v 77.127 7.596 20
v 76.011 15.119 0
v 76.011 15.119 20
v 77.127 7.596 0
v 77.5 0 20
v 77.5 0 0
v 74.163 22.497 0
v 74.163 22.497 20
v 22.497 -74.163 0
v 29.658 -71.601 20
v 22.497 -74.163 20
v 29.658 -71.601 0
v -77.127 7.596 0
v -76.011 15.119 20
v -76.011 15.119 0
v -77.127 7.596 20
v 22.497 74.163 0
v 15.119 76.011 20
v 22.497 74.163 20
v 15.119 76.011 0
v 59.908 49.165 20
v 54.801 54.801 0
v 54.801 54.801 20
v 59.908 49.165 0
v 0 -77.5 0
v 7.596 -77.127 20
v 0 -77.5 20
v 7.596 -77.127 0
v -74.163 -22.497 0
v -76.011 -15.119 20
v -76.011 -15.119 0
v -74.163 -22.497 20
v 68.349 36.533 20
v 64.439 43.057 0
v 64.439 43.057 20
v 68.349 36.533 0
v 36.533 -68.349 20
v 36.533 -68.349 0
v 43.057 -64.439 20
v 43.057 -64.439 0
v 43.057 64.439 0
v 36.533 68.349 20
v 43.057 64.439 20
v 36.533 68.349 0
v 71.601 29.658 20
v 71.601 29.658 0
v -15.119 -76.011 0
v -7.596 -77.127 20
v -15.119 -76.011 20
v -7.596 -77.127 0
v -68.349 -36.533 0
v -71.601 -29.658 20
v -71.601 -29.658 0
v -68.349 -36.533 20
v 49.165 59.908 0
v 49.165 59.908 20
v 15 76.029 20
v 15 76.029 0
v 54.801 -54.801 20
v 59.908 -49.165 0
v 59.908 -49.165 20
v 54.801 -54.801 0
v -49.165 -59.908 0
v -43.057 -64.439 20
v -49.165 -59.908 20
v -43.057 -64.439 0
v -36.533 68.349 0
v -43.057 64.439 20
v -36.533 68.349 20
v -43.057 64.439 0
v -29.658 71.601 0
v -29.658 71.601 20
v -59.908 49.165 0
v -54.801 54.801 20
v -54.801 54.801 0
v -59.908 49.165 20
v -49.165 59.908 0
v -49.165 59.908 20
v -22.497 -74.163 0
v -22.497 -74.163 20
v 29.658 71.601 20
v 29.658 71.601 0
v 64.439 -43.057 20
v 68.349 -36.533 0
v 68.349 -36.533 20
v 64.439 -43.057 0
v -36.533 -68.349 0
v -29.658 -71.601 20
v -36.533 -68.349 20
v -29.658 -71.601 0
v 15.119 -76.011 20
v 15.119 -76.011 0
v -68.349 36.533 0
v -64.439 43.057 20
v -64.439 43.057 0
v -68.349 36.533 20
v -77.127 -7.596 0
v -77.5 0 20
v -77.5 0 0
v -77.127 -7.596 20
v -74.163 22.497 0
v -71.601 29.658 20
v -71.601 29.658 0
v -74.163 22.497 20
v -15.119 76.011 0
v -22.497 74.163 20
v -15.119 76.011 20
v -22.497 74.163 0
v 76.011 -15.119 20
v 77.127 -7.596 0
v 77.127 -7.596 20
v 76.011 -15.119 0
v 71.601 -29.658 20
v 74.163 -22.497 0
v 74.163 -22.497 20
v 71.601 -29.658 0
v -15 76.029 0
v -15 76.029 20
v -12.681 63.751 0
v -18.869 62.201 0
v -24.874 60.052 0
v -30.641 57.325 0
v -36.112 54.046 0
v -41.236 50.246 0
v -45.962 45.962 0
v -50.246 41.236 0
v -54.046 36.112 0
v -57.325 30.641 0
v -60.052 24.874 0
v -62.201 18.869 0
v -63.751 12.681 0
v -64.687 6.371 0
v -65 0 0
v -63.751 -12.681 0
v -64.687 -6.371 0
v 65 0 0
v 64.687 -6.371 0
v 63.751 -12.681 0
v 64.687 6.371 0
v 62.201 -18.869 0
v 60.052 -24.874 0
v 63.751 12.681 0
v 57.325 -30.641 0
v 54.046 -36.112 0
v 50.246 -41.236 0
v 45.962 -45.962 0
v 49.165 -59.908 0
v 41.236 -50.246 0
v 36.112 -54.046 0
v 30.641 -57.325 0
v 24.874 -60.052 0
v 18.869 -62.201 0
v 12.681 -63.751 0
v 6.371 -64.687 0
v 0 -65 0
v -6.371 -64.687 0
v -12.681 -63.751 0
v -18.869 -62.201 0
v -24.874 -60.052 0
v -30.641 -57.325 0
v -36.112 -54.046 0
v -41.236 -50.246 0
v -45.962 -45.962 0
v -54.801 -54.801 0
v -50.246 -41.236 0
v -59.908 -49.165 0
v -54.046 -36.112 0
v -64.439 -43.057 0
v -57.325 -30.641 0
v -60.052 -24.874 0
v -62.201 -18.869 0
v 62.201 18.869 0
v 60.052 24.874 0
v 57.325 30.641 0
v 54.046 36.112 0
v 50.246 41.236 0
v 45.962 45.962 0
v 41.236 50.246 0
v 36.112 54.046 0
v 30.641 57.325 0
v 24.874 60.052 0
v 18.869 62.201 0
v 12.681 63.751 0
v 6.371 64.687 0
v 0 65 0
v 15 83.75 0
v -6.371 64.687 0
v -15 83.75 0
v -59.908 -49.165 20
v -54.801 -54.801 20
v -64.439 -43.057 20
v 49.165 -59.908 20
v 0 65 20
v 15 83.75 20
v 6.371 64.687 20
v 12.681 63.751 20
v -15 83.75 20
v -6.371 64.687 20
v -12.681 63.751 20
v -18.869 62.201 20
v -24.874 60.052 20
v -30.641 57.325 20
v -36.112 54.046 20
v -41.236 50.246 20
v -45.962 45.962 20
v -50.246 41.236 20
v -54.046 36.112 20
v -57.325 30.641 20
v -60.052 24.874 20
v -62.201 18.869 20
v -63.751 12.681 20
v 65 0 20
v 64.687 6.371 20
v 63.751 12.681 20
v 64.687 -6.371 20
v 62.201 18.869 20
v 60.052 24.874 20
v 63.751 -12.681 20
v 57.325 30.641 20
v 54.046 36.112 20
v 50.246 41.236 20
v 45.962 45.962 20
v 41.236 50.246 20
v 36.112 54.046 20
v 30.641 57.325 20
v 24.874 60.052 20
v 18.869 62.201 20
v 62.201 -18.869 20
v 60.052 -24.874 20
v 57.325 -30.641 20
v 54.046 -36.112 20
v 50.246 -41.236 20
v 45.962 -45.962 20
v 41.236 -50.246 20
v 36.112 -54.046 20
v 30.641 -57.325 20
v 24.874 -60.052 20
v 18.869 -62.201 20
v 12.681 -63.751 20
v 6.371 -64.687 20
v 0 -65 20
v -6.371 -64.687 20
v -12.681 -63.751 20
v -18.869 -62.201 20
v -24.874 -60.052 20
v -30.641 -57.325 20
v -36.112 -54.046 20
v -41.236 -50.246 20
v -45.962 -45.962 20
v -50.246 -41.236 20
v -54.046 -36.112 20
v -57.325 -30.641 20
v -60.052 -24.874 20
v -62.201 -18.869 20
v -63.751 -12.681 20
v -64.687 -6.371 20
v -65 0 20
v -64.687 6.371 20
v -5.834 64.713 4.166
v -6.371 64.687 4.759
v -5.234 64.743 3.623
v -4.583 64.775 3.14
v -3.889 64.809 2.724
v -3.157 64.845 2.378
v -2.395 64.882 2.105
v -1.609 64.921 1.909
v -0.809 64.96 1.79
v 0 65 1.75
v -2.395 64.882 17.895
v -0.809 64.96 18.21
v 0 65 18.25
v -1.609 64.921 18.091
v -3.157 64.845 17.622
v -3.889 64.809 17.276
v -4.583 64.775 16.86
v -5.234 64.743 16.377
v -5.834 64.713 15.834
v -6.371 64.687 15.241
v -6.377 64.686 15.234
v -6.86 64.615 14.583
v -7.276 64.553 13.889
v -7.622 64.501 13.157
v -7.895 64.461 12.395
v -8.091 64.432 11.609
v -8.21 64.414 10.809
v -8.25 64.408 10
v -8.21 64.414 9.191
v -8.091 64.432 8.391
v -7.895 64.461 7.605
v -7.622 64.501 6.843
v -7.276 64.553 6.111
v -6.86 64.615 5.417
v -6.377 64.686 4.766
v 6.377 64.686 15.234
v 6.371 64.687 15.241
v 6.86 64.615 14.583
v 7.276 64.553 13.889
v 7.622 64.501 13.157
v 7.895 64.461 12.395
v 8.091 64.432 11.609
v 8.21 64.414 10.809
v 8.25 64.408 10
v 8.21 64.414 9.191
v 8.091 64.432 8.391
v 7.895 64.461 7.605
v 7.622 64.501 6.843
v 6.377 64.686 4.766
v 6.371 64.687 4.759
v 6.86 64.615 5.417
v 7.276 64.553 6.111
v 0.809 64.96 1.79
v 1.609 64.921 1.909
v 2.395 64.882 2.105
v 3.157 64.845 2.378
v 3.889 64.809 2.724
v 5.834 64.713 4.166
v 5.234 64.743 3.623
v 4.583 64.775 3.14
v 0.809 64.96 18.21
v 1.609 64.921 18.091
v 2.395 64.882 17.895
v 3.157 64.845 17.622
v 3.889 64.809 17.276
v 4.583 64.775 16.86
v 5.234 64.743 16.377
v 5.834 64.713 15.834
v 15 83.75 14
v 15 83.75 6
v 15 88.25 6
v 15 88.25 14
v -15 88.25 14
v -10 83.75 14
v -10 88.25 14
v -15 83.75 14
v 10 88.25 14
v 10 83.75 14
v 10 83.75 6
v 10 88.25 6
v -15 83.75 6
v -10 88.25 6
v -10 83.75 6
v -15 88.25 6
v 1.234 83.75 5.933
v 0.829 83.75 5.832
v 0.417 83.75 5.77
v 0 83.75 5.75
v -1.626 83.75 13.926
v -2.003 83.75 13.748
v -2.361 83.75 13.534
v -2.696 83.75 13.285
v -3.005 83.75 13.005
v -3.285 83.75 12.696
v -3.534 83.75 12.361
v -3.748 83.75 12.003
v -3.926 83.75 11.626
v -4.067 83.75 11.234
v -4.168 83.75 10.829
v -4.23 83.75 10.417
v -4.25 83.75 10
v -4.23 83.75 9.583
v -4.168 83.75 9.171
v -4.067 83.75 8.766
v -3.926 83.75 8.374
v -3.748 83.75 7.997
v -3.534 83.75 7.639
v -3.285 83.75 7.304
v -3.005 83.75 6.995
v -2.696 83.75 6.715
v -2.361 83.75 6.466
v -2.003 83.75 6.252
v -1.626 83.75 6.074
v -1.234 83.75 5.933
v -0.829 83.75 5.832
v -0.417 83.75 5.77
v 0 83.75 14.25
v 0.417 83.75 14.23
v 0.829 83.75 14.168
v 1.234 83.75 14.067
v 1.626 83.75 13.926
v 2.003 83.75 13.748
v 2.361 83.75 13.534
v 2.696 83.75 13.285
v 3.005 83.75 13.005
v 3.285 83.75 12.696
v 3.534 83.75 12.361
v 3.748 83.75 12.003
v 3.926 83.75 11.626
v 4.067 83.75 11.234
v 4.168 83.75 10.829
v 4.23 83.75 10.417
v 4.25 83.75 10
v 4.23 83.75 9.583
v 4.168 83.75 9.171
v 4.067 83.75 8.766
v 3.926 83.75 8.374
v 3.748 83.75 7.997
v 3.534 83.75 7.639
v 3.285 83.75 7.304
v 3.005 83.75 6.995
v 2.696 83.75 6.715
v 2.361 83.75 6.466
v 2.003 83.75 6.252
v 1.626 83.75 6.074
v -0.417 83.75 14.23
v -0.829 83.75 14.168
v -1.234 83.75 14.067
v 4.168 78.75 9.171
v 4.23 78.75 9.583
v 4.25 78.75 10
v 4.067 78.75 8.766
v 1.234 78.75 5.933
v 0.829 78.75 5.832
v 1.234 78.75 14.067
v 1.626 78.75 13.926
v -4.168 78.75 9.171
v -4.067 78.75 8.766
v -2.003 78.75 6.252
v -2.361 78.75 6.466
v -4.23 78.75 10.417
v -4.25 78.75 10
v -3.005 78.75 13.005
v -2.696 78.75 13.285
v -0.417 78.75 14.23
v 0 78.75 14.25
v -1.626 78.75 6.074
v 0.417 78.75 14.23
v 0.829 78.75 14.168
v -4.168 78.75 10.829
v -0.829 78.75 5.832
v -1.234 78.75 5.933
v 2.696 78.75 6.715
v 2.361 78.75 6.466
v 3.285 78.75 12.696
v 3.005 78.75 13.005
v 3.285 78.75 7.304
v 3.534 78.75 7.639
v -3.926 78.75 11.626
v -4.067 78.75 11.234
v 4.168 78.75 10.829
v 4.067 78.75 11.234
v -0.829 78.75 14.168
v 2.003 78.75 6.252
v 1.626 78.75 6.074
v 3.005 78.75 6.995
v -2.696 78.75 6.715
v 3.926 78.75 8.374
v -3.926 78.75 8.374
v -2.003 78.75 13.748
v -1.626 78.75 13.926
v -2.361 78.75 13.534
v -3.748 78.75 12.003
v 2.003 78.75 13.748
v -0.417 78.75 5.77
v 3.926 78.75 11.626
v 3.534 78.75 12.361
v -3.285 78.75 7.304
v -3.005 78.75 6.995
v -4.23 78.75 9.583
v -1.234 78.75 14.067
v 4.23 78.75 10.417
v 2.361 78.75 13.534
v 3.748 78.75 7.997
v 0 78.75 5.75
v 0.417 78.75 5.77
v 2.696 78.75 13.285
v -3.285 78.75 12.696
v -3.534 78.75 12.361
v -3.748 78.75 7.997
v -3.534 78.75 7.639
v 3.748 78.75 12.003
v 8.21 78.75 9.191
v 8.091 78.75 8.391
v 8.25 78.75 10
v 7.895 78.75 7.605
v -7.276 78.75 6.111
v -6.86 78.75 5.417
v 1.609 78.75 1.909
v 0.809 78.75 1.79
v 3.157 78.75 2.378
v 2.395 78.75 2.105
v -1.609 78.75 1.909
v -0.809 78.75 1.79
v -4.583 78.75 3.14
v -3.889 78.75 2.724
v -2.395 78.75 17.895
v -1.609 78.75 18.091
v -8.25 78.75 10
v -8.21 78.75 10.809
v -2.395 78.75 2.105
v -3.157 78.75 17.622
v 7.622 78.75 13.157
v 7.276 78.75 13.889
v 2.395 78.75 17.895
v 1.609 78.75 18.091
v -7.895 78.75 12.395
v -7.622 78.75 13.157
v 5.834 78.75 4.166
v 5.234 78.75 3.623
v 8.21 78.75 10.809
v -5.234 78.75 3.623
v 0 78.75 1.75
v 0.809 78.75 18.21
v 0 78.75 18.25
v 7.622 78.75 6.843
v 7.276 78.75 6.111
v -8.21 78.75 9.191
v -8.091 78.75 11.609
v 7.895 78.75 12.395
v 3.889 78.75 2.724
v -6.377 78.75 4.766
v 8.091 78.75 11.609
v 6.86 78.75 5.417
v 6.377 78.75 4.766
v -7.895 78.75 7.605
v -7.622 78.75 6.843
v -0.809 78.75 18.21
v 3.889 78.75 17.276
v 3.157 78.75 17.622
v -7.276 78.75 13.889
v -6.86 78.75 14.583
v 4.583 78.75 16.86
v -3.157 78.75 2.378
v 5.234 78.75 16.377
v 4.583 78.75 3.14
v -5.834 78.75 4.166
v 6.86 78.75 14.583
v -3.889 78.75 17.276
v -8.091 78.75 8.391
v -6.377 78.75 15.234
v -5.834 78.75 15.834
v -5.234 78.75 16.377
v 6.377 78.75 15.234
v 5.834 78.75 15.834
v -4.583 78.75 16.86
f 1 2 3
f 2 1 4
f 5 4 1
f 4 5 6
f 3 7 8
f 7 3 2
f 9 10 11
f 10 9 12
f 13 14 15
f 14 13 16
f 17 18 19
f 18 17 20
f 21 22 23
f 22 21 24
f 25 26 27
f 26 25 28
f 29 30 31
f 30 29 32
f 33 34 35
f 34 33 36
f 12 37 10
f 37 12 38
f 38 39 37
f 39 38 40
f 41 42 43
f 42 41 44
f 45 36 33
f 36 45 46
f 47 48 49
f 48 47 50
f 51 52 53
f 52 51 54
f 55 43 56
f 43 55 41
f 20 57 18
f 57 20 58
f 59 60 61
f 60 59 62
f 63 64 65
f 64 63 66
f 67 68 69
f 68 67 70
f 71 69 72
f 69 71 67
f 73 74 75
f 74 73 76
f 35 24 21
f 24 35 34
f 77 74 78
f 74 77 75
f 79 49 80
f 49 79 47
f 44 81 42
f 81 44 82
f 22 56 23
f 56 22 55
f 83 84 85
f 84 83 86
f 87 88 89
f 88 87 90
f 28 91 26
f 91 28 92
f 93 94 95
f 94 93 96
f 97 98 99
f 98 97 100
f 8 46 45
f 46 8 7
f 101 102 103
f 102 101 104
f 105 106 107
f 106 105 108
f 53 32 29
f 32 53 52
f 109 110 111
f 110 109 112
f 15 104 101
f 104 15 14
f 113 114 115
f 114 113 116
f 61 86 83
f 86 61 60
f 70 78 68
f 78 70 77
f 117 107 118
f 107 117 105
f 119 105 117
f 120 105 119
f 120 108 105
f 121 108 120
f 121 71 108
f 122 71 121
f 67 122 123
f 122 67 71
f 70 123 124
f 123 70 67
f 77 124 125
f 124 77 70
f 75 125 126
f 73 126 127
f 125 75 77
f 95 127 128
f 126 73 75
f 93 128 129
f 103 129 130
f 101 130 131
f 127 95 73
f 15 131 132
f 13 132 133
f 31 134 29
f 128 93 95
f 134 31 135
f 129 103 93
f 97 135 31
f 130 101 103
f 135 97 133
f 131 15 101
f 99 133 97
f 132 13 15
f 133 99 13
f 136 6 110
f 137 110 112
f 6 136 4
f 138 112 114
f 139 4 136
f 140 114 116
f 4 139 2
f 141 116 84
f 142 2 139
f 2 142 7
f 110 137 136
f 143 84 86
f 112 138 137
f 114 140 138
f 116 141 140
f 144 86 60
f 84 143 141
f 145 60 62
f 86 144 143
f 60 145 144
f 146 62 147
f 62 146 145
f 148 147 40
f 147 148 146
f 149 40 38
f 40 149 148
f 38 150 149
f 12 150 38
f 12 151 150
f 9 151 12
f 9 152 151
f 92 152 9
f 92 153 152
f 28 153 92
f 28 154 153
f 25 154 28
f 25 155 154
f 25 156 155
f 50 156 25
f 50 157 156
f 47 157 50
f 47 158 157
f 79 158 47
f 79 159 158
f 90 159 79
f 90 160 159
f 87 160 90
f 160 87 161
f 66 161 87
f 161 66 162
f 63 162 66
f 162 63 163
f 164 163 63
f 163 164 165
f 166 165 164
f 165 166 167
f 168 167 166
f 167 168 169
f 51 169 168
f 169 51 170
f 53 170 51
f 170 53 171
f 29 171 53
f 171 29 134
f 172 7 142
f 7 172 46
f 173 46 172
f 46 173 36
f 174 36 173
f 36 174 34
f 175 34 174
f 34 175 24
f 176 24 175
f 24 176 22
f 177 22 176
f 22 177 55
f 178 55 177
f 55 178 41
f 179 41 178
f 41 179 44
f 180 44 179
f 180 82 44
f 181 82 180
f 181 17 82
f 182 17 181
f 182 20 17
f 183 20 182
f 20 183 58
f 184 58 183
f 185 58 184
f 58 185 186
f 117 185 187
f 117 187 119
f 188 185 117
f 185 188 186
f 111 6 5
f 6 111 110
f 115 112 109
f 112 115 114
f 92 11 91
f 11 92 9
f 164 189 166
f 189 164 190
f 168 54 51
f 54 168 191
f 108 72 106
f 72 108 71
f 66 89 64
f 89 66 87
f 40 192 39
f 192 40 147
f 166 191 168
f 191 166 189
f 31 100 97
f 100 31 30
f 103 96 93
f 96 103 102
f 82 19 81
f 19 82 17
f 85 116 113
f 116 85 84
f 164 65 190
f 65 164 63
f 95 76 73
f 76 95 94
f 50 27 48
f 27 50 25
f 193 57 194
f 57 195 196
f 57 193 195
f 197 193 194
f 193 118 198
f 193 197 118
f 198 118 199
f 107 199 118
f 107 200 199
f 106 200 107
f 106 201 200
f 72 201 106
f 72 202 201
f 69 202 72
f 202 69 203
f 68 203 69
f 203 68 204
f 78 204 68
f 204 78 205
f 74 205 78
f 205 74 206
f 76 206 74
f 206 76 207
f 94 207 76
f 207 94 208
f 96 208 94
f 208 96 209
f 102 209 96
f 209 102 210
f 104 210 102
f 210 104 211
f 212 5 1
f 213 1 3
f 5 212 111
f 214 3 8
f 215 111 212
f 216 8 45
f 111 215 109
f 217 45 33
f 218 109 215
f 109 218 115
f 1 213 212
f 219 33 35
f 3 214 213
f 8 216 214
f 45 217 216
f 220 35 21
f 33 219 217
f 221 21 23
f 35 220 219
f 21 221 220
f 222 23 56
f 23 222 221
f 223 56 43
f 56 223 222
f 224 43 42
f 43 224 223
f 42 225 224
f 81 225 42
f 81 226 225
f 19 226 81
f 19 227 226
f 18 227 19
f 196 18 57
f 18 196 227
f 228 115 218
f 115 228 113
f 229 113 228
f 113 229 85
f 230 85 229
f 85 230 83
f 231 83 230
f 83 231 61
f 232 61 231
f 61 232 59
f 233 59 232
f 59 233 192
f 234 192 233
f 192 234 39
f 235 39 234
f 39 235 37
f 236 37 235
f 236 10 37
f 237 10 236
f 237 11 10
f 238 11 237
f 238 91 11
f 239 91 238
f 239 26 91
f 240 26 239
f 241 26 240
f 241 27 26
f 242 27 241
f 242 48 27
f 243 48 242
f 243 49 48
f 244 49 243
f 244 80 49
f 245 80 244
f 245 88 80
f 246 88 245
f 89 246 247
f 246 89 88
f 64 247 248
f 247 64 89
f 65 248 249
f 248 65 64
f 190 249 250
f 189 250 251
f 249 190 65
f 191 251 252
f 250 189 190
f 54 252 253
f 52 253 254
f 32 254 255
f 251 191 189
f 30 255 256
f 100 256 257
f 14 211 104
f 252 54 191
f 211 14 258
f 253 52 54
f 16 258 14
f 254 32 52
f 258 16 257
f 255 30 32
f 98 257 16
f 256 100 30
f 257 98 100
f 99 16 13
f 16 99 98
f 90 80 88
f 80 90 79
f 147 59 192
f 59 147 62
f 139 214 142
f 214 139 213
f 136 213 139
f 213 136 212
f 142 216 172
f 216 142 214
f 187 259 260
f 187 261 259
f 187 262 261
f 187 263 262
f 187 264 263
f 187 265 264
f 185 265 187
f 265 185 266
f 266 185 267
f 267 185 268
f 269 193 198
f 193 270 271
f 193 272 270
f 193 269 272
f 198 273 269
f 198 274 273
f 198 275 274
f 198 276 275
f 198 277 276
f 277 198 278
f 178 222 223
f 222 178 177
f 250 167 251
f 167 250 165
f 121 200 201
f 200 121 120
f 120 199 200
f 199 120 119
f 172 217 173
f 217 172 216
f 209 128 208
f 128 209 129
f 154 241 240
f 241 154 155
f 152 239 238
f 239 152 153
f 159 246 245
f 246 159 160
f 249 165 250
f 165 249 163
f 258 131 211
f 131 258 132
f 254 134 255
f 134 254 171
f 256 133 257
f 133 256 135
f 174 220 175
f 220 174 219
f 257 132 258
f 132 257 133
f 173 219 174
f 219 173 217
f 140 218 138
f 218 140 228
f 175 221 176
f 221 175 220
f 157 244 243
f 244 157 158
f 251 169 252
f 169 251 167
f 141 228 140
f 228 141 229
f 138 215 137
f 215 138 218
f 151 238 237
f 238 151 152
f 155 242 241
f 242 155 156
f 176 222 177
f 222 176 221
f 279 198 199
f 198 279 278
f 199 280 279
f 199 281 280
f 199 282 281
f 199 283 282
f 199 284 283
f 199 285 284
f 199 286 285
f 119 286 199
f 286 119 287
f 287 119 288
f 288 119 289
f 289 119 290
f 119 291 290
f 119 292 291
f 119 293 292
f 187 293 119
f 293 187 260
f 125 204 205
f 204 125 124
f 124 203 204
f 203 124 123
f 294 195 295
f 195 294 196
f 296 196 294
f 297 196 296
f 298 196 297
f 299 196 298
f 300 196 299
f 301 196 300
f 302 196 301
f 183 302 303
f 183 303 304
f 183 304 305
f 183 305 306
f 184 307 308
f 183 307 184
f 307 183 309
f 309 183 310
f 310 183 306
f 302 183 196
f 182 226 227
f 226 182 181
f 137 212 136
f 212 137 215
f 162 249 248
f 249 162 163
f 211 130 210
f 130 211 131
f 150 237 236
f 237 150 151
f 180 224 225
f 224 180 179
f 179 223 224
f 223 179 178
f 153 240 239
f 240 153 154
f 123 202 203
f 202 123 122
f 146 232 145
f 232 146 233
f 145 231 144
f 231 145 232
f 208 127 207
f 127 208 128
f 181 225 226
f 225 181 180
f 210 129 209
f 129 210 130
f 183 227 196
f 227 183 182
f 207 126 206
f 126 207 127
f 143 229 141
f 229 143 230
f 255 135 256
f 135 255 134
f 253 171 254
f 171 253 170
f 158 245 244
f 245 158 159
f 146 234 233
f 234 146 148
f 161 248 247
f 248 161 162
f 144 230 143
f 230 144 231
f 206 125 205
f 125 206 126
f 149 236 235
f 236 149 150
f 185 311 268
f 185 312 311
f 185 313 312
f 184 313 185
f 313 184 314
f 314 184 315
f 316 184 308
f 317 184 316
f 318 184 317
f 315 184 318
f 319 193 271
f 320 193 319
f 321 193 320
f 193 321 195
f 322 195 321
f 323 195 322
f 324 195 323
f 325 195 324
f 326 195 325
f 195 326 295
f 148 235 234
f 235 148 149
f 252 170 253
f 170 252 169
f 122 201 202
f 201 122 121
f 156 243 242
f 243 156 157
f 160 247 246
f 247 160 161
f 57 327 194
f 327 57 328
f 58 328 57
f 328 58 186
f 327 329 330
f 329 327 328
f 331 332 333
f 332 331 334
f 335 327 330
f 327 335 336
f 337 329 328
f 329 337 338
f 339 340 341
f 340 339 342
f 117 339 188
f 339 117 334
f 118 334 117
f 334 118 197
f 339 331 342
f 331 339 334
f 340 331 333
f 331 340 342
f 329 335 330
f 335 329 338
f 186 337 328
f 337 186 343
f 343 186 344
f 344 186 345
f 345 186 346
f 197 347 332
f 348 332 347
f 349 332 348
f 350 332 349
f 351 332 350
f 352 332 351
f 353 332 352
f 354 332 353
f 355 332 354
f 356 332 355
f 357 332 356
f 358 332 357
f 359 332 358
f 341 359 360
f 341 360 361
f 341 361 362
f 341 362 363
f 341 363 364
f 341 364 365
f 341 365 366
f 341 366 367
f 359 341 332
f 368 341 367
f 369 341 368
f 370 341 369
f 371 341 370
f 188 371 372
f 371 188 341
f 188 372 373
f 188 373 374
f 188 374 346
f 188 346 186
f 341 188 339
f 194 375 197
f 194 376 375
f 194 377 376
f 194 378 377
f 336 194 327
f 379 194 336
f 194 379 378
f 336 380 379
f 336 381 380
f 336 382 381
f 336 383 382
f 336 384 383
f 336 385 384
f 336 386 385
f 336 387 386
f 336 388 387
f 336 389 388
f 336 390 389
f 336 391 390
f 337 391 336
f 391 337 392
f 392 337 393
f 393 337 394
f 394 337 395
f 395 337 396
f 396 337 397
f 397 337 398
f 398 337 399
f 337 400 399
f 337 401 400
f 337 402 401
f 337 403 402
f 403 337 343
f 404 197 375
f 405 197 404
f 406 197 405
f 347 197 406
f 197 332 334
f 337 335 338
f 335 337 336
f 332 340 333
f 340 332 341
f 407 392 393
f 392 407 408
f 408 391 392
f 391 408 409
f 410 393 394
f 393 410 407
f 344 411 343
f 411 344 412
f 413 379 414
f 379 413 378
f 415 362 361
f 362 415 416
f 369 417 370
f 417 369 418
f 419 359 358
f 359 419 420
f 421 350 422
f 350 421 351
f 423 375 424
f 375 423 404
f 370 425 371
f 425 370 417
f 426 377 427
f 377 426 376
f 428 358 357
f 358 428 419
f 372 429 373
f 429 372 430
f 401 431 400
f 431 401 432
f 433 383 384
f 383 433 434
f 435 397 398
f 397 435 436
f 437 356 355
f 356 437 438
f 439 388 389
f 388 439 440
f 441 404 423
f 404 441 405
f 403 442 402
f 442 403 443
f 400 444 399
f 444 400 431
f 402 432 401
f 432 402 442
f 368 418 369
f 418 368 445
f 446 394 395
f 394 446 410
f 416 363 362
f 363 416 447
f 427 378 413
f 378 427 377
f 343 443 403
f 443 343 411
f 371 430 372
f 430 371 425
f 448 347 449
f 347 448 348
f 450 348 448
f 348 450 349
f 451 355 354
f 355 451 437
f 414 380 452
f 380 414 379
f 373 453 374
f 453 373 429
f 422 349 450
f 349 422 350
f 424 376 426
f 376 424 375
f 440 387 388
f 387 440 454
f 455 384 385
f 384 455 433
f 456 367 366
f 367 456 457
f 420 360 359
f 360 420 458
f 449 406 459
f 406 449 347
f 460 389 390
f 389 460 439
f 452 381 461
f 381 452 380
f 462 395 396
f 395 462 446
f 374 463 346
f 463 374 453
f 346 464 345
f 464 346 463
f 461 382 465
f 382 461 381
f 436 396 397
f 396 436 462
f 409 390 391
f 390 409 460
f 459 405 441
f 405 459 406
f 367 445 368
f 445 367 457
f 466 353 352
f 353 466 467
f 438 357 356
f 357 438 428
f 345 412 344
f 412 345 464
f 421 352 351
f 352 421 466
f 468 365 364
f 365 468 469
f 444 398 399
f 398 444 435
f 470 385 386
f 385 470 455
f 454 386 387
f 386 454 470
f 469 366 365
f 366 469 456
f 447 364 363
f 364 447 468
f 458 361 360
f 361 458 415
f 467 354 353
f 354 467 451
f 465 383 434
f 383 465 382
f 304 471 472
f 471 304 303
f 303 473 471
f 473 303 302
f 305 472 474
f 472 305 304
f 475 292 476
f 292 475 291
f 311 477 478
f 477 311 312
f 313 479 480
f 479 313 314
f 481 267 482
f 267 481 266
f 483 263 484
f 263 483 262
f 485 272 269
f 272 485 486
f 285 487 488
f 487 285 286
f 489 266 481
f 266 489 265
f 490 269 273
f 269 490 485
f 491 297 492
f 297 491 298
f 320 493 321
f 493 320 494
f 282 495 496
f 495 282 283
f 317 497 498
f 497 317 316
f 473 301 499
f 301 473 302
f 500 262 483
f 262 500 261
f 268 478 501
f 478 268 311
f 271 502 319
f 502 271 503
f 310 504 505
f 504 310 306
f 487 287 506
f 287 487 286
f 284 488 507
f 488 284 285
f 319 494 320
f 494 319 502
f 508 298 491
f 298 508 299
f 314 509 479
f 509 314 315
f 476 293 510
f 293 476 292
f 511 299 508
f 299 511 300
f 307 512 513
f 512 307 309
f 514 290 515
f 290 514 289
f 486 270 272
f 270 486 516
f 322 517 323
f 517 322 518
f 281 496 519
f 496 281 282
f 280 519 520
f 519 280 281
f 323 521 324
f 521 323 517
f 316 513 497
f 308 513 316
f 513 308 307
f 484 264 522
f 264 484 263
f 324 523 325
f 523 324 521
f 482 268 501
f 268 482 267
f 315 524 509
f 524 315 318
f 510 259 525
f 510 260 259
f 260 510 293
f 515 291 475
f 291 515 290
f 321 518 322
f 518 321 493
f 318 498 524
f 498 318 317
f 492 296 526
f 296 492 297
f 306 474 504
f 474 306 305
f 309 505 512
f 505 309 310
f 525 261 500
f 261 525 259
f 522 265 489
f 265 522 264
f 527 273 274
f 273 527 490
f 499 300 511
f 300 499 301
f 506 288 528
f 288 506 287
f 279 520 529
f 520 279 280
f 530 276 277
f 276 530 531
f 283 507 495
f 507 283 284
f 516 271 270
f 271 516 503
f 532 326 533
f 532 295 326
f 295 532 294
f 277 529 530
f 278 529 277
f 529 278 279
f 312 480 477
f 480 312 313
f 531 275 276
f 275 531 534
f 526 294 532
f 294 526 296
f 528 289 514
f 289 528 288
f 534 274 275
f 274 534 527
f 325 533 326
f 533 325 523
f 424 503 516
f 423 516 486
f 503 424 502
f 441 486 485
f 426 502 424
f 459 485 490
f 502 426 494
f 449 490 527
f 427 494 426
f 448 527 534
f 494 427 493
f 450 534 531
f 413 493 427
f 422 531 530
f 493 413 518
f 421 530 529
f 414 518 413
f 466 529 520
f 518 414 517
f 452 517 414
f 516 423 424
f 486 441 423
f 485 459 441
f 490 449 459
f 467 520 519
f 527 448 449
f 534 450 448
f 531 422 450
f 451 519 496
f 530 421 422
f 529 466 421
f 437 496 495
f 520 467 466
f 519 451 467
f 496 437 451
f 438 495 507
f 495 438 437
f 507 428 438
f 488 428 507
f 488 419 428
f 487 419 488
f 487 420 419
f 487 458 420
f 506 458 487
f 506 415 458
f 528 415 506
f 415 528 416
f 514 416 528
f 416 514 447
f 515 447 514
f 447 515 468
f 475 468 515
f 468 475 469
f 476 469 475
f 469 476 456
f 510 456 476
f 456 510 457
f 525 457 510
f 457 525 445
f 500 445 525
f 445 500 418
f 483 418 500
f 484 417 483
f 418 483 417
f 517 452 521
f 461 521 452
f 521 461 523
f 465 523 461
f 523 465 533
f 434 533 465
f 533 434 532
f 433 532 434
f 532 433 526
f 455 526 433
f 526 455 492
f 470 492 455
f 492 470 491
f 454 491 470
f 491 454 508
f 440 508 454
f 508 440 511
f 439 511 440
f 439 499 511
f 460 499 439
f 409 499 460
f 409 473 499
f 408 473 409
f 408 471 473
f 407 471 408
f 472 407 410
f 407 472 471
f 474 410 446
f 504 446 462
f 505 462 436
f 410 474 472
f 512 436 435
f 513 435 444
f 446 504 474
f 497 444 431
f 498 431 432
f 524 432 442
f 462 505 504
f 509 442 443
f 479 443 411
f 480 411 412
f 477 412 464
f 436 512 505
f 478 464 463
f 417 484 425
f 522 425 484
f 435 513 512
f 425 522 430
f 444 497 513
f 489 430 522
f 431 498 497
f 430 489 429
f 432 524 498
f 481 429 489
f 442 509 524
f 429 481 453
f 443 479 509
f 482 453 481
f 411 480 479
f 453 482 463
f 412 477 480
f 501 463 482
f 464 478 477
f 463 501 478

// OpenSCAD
// Föhnhalter, vong Bad her
$fn=64;
ring = [130, 20];
wall = 12.5;
chole = [5.25, 21, 19];
crot = -45;
shole = [4, 9, 2];
wallcube = [30, 12.5];
alu = [40, 8, 4.5];
alu_screw = [16.5, 8.5, 15];
insert_z = 20;

difference(){
	union(){
		difference(){
			cylinder(d=ring.x + 2*wall, h=ring.y);
			cylinder(d=ring.x, h=ring.y);
		}
		translate([-wallcube.x/2, ring.x/2+wall/2, 0]) cube([wallcube.x, wallcube.y, ring.y]);
		translate([-wallcube.x/2, ring.x/2+wallcube.y + wall/2, ring.y/2-alu.y/2]) difference(){
			 cube([wallcube.x, alu.z, alu.y]);
			 translate([wallcube.x/2-insert_z/2, 0, 0]) cube([insert_z, alu.z, alu.y]);

		}
	}

	translate([0, ring.x/2 - wallcube.y/2, ring.y/2]) rotate([-90, 0, 0]) cylinder(d=alu_screw.y, h=wallcube.y*2);
	translate([0, ring.x/2 - 1.25, ring.y/2]) rotate([-90, 0, 0]) cylinder(d=alu_screw.x, h=alu_screw.z);
}
